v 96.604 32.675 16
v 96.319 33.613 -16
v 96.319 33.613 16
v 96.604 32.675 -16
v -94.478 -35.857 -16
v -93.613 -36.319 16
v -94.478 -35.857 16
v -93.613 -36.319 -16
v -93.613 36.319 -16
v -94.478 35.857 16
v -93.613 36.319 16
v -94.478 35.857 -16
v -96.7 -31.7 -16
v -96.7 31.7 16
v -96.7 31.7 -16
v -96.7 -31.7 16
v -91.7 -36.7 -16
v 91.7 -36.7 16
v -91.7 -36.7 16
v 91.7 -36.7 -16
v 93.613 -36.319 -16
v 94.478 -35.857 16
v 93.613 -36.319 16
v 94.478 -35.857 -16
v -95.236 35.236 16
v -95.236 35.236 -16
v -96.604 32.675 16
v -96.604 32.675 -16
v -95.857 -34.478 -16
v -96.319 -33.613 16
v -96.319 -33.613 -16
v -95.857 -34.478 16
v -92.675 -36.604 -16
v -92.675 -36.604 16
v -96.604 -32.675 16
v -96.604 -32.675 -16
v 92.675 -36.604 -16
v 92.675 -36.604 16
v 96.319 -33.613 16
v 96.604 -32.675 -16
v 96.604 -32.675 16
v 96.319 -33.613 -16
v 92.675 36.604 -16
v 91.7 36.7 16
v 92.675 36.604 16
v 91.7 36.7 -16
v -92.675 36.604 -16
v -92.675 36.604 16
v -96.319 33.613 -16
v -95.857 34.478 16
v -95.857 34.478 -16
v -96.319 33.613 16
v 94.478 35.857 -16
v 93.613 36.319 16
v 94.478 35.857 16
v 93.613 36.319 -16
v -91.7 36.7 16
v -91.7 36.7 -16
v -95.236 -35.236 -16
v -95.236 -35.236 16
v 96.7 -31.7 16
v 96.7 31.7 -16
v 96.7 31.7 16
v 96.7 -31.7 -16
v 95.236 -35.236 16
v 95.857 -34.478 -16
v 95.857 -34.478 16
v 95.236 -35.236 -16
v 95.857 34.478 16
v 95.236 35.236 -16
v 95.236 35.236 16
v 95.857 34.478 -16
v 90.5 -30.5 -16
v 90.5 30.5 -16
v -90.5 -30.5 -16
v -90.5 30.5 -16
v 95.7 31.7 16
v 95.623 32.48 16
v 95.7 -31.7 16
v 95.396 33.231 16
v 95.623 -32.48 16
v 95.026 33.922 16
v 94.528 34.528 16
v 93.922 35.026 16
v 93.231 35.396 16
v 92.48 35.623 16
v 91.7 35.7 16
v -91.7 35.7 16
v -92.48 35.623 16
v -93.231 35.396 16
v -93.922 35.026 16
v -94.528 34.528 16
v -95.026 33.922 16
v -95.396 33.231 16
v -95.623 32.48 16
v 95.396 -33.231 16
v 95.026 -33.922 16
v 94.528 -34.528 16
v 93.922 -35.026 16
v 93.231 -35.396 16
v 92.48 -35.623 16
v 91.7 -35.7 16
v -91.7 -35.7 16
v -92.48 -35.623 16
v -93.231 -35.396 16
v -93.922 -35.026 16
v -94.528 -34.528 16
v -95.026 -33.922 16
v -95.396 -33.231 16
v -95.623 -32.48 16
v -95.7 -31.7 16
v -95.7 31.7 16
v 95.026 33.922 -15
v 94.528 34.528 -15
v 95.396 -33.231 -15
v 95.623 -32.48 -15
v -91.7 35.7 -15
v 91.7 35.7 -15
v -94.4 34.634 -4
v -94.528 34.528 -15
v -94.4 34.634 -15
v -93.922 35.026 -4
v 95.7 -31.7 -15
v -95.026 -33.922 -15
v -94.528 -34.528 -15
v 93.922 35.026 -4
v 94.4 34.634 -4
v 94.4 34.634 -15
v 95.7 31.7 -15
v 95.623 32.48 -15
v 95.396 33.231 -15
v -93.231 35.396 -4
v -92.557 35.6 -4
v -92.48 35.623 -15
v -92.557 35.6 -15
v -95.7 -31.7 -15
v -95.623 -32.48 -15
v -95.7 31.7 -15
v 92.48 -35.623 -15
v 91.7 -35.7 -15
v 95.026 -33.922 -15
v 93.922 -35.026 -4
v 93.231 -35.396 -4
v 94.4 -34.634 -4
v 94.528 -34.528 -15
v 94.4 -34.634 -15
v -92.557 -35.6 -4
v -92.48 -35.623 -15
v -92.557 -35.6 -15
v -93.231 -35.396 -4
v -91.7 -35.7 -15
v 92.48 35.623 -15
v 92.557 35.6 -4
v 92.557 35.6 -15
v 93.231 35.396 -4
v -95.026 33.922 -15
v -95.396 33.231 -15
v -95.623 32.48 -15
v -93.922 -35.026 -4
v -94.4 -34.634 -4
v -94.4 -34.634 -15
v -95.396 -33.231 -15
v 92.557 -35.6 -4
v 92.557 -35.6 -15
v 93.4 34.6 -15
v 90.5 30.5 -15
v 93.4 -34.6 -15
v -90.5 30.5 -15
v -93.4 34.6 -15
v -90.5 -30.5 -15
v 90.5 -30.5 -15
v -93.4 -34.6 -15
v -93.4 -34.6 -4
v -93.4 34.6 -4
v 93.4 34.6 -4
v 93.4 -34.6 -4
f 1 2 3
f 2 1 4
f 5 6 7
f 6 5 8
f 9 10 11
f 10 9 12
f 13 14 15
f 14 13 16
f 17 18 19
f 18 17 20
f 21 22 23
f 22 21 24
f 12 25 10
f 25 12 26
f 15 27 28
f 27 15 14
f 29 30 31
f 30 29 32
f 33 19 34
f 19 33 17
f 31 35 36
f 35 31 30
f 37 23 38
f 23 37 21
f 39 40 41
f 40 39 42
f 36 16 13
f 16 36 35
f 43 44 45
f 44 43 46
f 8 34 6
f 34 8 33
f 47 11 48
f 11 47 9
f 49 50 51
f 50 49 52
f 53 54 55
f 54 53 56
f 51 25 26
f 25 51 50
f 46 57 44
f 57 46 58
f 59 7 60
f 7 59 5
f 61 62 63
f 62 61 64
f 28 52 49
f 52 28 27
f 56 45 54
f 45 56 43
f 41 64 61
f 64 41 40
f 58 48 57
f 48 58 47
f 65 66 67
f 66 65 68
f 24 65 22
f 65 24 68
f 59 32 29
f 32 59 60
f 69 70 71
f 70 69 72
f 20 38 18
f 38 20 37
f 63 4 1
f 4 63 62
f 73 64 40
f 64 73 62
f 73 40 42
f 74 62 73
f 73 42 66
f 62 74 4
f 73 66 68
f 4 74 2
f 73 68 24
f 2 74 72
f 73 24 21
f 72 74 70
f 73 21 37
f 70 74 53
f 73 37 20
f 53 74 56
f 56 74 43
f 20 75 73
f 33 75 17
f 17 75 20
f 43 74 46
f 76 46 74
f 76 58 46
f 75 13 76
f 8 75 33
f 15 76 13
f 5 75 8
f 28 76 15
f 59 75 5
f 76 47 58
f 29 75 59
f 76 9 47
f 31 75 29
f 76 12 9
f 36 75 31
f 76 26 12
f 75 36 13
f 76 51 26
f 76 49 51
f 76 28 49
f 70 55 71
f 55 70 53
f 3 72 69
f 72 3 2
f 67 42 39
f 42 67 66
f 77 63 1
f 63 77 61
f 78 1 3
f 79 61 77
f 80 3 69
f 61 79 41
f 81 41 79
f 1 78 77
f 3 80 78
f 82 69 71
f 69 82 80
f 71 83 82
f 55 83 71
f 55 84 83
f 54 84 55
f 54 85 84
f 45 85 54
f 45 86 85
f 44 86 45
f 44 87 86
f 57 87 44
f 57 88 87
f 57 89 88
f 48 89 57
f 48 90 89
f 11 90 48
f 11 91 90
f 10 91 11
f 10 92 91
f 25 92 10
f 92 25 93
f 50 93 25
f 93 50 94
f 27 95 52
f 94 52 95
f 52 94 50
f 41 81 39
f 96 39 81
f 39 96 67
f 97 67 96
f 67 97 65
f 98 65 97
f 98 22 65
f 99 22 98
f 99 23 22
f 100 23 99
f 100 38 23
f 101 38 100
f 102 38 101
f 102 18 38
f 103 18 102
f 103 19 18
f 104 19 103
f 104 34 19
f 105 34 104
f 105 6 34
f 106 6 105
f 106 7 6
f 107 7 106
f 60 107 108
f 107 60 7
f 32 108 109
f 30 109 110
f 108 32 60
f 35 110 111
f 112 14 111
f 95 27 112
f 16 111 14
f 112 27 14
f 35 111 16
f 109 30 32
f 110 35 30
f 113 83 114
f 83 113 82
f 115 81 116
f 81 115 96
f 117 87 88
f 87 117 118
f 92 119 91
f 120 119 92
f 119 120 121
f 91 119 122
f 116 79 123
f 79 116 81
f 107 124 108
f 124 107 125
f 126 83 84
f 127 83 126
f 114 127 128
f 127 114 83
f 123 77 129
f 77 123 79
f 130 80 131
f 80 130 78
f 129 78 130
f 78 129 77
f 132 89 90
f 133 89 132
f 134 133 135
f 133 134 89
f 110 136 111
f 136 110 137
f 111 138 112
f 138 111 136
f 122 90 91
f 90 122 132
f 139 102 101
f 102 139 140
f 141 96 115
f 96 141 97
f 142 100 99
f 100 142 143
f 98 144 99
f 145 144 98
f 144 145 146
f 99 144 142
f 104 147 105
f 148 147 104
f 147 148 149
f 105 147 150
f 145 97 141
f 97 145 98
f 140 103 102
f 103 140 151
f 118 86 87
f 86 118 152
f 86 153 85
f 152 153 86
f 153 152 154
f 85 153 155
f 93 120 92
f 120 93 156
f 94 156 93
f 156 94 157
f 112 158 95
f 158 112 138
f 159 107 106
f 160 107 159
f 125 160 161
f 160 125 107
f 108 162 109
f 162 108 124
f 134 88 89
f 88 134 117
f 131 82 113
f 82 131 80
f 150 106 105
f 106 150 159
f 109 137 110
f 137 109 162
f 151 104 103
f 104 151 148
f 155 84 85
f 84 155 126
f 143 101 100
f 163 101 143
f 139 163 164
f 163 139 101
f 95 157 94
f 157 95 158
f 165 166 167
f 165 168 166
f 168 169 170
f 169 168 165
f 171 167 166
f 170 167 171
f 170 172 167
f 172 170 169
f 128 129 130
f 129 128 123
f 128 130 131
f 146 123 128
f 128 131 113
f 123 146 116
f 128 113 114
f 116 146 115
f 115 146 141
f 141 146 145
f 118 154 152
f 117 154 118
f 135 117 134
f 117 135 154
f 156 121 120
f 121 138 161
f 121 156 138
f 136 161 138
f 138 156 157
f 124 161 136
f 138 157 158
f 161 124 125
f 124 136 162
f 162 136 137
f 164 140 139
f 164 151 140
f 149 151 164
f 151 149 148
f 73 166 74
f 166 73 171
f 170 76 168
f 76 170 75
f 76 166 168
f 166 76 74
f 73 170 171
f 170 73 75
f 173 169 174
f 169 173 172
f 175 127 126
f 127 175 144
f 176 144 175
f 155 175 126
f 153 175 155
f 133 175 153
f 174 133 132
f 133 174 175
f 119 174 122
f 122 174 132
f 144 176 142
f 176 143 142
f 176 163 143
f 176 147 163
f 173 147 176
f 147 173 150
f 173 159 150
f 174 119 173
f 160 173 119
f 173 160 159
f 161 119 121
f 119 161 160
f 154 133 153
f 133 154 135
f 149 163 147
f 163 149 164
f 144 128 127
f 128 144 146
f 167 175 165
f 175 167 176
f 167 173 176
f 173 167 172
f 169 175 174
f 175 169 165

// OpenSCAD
// file: grid.scad
module grid(size, dim, thick, center) {
    width = size[0];
    depth = size[1];
    height = size[2];
    
    nx = dim[0];
    ny = dim[1];
    
    tx = thick[0];
    ty = thick[1];
    
    dx = center?-width/2:0;
    dy = center?-depth/2:0;
    dz = center?-height/2:0;

    translate([dx,dy,dz])
        union() {
            for(xi = [0:nx])
                translate([(width-tx)/nx*xi,0,0])
                    cube([tx,depth,height]);
            for(yi = [0:ny])
                translate([0,(depth-ty)/ny*yi,0])
                    cube([width,ty,height]);
        }
}
// file: rcube.scad
module scube(size, radius, center) {
    width = size[0];
    depth = size[1];
    height = size[2];
    
    dx = center?-width/2:0;
    dy = center?-depth/2:0;
    dz = center?-height/2:0;
    
    x0 = radius;
    x1 = width - radius;
    y0 = radius;
    y1 = depth - radius;
    z0 = radius;
    z1 = height - radius;
    
    spheres = [[x0,y0,z0],[x0,y1,z0],[x1,y1,z0],[x1,y0,z0],[x0,y0,z1],[x0,y1,z1],[x1,y1,z1],[x1,y0,z1]];
    
    translate([dx,dy,dz]) {
        hull()
            for (sphere = spheres) {
                translate(sphere)
                    sphere(radius);
            }
    }
}

module ccube(size, radius, center) {
    width = size[0];
    depth = size[1];
    height = size[2];
    
    dx = center?-width/2:0;
    dy = center?-depth/2:0;
    dz = center?-height/2:0;
    
    x0 = radius;
    x1 = width - radius;
    y0 = radius;
    y1 = depth - radius;
    
    cylinders = [[x0,y0,0],[x0,y1,0],[x1,y1,0],[x1,y0,0]];
    
    translate([dx,dy,dz]) {
        hull()
            for (cylinder = cylinders) {
                translate(cylinder)
                    cylinder(height, r=radius, center=false);
            }
    }
}
// main file
use <rcube.scad>;
use <grid.scad>;

    xn = 17;
    yn = 5;
    cx = 10;
    cy = 10;
    width = xn*cx;
    depth = yn*cy;
    height = 5;
    
    th = 0.6;
    wallth = 1;
    
    pcbborder = 7.8;
    pcbth = 2;
    glassth = 4;
    
    delta = 0.6;    
    
    gridstuffheight = glassth+height+pcbth;
    bodywidth = width+3*pcbborder;
    bodydepth = depth+3*pcbborder;
    bodyheight = wallth+gridstuffheight+20;

    hoodheight = 20;
    
    batterysize = [68,20,20];
    batterypos = [0,-20,7];
    
    speakerpos = [-73,13,10];
    speakersize = 38;
    
    powerpos = [33,18,10];
    powersize = [];
    
    sensorpos = [-67,-20,10];
    
    ad = 3.1;
    sd = 3.5;

module clockgrid() {
    difference() {
    union() {
    translate([-88.5,0,-11]) {
        cylinder(d=6.5, h=height, $fn=32);
    }
    translate([88.5,0,-11]) {
        cylinder(d=6.5, h=height, $fn=32);
    }
    translate([0,28.5,-8.5]) {
        cube([8,7,height], true);
    }
    translate([0,-28.5,-8.5]) {
        cube([8,7,height], true);
    }

    translate([0,0,-(bodyheight-gridstuffheight)/2+wallth])
    translate([0,0,(glassth-pcbth)/2]){
    
    color("grey", alpha=1) {
        union() {
            grid([width,depth,height],[xn,yn],[th,th],true);
            grid([width+2*pcbborder,depth+2*pcbborder,height],[1,1],[wallth,wallth],true);
            translate([0,0,(-height+wallth)/2])
                grid([width+2*pcbborder,depth+2*pcbborder,wallth],[1,1],[pcbborder,pcbborder],true);
        }
    }
}
/*
    color("white", alpha=0.1) {
        translate([0,0,(-height-glassth)/2])
            cube([width+2*pcbborder,depth+2*pcbborder,glassth],true);
    }
    color("green", alpha=0.5) {
        translate([0,0,(height+pcbth)/2])
            cube([width+2*pcbborder,depth+2*pcbborder,pcbth],true);
    }
 */
    }
    
    
    translate([88.5,0,-12]) {
        cylinder(d=5.3, h=height+2, $fn=32);
    }    
    translate([-88.5,0,-12]) {
        cylinder(d=5.3, h=height+2, $fn=32);
    }
    
    translate([0,28.5,-8.5]) {
        cube([7,6,height+2], true);
    }
    translate([0,-28.5,-8.5]) {
        cube([7,6,height+2], true);
    }

}
}

module cbody(size,radius,wallth) {
    width = size[0];
    depth = size[1];
    height = size[2];
    
    difference() {
        ccube([width,depth,height], radius, center=true, $fn=32);
        translate([0,0,wallth])
            ccube([width-2*wallth,depth-2*wallth,height], radius-wallth, center=true, $fn=32);
    }
}

module clockbody() {
    color("grey", alpha=1) {
        difference() {
            cbody([bodywidth,bodydepth,bodyheight],5,wallth);
            cube([width+11,depth+11,bodyheight+1],true);
        }

        translate([0,0,-(bodyheight-gridstuffheight)/2+wallth])
            grid([width+2*pcbborder+2*wallth+2*delta,depth+2*pcbborder+2*wallth+2*delta+2.4,gridstuffheight],[1,1],[wallth,wallth],true);
    }
}



module addbattery() {
    difference() {
        union() {
            children();
            translate(batterypos)
                grid([batterysize[0]+wallth*2,batterysize[1]+wallth*2,batterysize[2]],[1,1],[wallth,wallth],true);
        }
        translate(batterypos) {
            for (nx = [-5:5])
                for (ny = [-1:1])
                    translate([nx*5.6,ny*3.3,-7])
                        cylinder(d=ad, h=20, $fn=6);
            for (nx = [-4.5:4.5])
                for (ny = [-1.5:1.5])
                    translate([nx*5.6,ny*3.3,-7])
                        cylinder(d=ad, h=20, $fn=6);
        }
    }
}

module addspeaker() {
    difference() {
        union() {
            children();
                translate(speakerpos)
                    difference() {
                        cylinder(d=speakersize+2*wallth, h=6, $fn=32);
                        translate([0,0,-1])
                            cylinder(d=speakersize, h=8, $fn=64);
                    }
        }
        for (nx = [-2:2])
            for (ny = [-3:3])
                translate([speakerpos[0]+nx*5.6,speakerpos[1]+ny*3.3,speakerpos[2]])
                    cylinder(d=ad, h=20, $fn=6);
        for (nx = [-1.5:1.5])
            for (ny = [-3.5:3.5])
                translate([speakerpos[0]+nx*5.6,speakerpos[1]+ny*3.3,speakerpos[2]])
                    cylinder(d=ad, h=20, $fn=6);

    }
}

module addsensor() {
    difference() {
        union() {
            translate(sensorpos)
                grid([50,24,14],[1,1],[wallth,wallth],true);
            children();
        }
        translate(sensorpos) {
            for (nx = [-3:3])
                for (ny = [-2:2])
                    translate([nx*5.6,ny*3.3,0])
                        cylinder(d=ad, h=20, $fn=6);        
            for (nx = [-2.5:2.5])
                for (ny = [-1.5:1.5])
                    translate([nx*5.6,ny*3.3,0])
                        cylinder(d=ad, h=20, $fn=6);        
        }
    }
}

module addkeys() {
    difference() {
        union() {
            children();
            translate([90,-30,14])
                cylinder(d=7, h=3, $fn=32);
            translate([90,30,14])
                cylinder(d=7, h=3, $fn=32);
            translate([70,-30,14])
                cylinder(d=7, h=3, $fn=32);
            translate([70,30,14])
                cylinder(d=7, h=3, $fn=32);
            translate([78,0,16])
                cube([23,12*4,2],true);

        }
        translate([90,-30,0])
            cylinder(d=sd, h=20, $fn=32);
        translate([90,30,0])
            cylinder(d=sd, h=20, $fn=32);
        translate([70,-30,0])
            cylinder(d=sd, h=20, $fn=32);
        translate([70,30,0])
            cylinder(d=sd, h=20, $fn=32);        
        
        translate([90-1,-24,0])
            cube([1,12*4,20]);
        for (nx = [-2:2])
            translate([65,-0.5+12*nx,0])
                cube([25,1,20]);
        for (nx = [-1.5:1.5]) {
            translate([65,3+12*nx,0])
                cube([1,3,20]);
            translate([65,-6+12*nx,0])
                cube([1,3,20]);
        }
    }
}

module addpower() {
    difference() {
        union() {
            translate(powerpos)
                grid([56,28,14],[1,1],[wallth,wallth],true);
            children();
            translate(powerpos) {
                translate([-23,-9,4])
                    cylinder(d=7, h=3, $fn=32);
                translate([+23,-9,4])
                    cylinder(d=7, h=3, $fn=32);
                translate([-23,+9,4])
                    cylinder(d=7, h=3, $fn=32);
                translate([+23,+9,4])
                    cylinder(d=7, h=3, $fn=32);            
            }
        }

        translate(powerpos) {
            translate([-23,-9,0])
                cylinder(d=sd, h=20, $fn=32);
            translate([23,-9,0])
                cylinder(d=sd, h=20, $fn=32);
            translate([-23,9,0])
                cylinder(d=sd, h=20, $fn=32);
            translate([23,9,0])
                cylinder(d=sd, h=20, $fn=32);
            for (nx = [-3:3])
                for (ny = [-1:1])
                    translate([nx*5.6,ny*3.3,0])
                        cylinder(d=ad, h=20, $fn=6);        
            for (nx = [-2.5:2.5])
                for (ny = [-1.5:1.5])
                    translate([nx*5.6,ny*3.3,0])
                        cylinder(d=ad, h=20, $fn=6);        
        }
    }
}

module addpowercordholder() {
    difference() {
        union() {
            children();
            translate([0,30,13])
                cylinder(d=7, h=4, $fn=32);
        }
        translate([0,30,0])
            cylinder(d=4, h=20, $fn=32);
    }
}


module clockhood() {
    difference() {
        union() {
            translate([0,0,(bodyheight-hoodheight)/2+wallth]) {
                translate([0,0,(hoodheight-wallth)/2])
                    ccube([bodywidth,bodydepth,wallth], 5, center=true, $fn=32);
                difference() {
                    ccube([bodywidth-2*wallth-2*delta,bodydepth-2*wallth-2*delta,hoodheight], 5-wallth-delta, center=true, $fn=32);
                    translate([0,0,-wallth])
                        ccube([bodywidth-4*wallth-2*delta,bodydepth-4*wallth-2*delta,hoodheight], 5-2*wallth-delta, center=true, $fn=32);
                }
            }
        }
    }
}

//clockgrid();
clockbody();
/*
addsensor()
addkeys()
addpower()
addspeaker()
addbattery()
addpowercordholder()
color("grey", alpha=1)
clockhood();
*/
